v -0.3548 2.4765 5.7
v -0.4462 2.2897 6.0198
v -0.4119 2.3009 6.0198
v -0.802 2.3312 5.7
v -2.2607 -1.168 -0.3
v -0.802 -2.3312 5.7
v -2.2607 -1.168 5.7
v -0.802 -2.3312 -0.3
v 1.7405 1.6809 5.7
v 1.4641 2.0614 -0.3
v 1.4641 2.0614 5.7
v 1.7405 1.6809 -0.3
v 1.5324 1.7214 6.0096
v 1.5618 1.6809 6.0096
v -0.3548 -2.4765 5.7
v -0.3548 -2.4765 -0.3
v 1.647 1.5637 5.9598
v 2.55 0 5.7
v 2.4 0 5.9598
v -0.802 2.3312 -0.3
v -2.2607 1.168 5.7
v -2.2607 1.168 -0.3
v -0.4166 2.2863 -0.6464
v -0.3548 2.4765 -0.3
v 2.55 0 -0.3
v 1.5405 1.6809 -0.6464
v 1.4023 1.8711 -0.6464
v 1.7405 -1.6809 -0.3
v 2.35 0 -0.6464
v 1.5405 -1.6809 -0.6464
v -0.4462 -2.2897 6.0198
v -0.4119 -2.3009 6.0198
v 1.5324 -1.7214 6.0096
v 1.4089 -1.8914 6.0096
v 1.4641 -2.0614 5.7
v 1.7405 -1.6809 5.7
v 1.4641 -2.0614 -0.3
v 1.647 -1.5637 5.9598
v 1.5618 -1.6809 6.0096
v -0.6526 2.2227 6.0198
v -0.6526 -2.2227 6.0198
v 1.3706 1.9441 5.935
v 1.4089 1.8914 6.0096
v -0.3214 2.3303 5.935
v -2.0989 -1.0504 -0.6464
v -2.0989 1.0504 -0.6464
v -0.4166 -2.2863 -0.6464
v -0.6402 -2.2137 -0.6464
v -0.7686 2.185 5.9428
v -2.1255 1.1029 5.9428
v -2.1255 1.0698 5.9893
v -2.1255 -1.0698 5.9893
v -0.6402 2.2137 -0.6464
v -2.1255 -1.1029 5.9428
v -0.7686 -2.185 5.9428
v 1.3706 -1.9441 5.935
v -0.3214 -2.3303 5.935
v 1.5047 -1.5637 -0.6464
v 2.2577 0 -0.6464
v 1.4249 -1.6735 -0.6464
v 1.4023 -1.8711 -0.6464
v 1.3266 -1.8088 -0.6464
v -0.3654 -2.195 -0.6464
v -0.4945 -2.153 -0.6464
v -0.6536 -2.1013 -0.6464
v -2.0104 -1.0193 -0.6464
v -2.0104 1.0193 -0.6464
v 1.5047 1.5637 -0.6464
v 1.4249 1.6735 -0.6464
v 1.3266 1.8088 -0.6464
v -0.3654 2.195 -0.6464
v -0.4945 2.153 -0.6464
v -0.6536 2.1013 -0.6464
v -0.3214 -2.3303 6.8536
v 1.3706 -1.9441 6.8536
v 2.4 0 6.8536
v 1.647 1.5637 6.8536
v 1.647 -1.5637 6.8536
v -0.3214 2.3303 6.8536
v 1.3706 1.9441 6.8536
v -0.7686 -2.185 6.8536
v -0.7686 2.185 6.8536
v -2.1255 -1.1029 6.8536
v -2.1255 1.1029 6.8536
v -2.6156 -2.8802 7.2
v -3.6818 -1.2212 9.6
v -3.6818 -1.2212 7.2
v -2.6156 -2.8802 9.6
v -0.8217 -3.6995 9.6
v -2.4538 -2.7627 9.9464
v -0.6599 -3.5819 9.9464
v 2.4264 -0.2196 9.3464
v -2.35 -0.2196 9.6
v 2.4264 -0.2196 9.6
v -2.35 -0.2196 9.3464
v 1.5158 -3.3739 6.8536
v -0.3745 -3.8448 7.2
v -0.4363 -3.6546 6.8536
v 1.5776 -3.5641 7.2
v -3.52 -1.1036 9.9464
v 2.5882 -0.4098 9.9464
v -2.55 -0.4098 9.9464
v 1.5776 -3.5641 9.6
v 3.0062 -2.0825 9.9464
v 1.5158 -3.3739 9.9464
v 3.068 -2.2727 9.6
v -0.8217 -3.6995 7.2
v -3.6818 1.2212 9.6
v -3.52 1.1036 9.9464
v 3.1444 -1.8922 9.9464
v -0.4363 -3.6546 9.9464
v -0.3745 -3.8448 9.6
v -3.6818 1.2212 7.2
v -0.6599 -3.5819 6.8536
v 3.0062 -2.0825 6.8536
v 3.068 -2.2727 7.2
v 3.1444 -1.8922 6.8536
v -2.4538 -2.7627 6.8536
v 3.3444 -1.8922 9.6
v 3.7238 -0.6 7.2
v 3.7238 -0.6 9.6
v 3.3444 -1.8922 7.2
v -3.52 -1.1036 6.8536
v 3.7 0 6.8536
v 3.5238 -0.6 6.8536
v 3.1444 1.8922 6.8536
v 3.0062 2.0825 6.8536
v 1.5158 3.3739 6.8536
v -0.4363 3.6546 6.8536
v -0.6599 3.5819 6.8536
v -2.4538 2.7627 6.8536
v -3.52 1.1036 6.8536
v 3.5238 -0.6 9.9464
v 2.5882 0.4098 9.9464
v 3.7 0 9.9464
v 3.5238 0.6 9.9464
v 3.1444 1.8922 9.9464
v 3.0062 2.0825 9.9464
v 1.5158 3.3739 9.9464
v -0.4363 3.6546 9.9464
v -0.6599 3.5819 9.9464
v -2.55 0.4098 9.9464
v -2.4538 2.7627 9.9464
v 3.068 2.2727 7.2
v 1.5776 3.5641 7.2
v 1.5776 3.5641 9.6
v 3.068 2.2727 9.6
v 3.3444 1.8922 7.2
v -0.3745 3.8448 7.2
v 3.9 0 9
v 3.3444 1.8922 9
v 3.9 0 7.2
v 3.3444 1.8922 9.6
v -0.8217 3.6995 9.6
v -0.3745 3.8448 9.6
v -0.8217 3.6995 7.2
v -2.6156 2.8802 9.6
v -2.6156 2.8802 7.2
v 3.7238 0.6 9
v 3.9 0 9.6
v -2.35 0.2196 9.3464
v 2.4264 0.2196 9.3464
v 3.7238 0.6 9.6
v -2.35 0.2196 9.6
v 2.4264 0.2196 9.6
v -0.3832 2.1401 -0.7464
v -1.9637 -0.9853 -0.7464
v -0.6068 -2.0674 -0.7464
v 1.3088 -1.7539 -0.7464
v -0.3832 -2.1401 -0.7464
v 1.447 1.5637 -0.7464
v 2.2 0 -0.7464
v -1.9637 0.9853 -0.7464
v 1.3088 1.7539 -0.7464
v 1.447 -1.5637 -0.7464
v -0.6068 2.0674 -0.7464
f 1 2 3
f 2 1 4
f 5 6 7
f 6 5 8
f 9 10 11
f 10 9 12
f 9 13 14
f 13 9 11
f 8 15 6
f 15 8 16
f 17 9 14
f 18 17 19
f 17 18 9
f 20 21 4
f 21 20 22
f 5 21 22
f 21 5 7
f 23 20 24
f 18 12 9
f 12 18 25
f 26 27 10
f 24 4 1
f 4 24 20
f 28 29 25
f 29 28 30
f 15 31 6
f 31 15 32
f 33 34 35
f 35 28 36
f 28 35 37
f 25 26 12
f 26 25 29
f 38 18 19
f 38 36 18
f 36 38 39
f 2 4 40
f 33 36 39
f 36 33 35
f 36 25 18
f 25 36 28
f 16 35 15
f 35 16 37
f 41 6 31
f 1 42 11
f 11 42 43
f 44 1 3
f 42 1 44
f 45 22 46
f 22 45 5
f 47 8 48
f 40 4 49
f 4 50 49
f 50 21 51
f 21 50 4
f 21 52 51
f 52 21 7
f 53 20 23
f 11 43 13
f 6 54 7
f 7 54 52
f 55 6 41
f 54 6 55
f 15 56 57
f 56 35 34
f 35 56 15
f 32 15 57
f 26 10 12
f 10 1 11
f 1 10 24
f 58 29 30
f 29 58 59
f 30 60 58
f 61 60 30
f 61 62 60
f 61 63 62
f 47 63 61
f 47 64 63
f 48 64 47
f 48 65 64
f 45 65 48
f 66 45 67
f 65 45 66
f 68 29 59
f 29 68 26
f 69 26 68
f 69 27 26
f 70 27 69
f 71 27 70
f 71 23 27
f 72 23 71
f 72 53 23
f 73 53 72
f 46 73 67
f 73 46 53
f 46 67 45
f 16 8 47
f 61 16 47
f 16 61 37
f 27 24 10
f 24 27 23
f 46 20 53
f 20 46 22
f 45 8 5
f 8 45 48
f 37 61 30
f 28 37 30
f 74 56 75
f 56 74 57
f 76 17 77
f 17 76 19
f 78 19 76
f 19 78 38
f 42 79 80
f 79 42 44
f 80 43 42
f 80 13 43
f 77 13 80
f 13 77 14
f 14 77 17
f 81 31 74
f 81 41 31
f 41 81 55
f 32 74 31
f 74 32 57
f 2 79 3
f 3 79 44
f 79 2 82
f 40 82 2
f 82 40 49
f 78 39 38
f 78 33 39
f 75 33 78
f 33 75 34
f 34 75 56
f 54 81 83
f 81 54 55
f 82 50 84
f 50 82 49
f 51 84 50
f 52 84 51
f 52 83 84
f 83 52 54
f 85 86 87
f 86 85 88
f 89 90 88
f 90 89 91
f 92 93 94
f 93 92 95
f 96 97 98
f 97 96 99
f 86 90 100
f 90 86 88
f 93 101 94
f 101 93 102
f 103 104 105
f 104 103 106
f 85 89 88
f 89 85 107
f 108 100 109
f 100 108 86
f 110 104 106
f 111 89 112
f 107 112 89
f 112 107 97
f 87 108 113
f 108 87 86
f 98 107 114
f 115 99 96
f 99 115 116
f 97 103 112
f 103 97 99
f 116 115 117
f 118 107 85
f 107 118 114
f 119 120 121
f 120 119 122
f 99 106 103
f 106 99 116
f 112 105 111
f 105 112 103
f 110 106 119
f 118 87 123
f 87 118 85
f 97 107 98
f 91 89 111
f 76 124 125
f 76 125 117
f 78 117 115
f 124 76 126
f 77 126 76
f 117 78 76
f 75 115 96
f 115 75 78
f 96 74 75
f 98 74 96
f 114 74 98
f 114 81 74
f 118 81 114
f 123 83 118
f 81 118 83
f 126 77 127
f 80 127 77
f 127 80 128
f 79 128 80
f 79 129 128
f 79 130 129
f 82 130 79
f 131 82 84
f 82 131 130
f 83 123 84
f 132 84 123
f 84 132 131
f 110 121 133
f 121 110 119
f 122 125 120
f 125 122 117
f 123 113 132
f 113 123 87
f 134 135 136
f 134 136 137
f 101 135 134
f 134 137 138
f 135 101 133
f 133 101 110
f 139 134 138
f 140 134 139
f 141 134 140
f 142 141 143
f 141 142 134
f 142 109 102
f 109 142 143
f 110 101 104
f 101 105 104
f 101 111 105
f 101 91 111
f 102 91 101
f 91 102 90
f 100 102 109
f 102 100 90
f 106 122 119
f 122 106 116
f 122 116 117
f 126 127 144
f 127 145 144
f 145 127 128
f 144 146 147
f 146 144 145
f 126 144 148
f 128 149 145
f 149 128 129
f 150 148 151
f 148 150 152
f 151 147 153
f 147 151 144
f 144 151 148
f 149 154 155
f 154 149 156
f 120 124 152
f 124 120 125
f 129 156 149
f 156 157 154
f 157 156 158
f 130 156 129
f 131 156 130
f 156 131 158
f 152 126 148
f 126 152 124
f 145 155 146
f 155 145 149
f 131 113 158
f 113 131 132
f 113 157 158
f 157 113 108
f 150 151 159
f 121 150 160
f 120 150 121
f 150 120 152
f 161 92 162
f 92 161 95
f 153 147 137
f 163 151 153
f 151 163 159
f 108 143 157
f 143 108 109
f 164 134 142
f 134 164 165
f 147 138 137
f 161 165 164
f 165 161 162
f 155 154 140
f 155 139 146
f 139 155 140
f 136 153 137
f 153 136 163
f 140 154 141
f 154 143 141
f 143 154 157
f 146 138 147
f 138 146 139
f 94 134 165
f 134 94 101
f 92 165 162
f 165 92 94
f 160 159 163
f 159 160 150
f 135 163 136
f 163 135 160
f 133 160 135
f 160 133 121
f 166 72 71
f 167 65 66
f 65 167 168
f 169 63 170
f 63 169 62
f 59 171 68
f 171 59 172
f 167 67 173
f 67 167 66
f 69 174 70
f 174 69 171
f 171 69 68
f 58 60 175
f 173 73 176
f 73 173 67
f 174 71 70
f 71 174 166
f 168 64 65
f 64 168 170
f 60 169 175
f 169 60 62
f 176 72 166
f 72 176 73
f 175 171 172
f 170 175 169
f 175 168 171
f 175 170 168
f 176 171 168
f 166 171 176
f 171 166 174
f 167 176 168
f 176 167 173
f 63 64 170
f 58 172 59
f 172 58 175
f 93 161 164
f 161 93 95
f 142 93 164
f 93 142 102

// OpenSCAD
// Parameters
screw_length = 10; //[5:20:0.1]
shank_diameter = 4; //[2:8:0.1]
head_diameter = 7; //[3.5:14:0.1]
head_height = 2.4; //[1.2:4.8:0.1]
tip_chamfer_height = 0.5; //[0.2:1.5:0.05]
tip_chamfer_diameter_reduction = 0.8; //[0.2:2:0.05]
overlap = 0.8; //[0.2:2:0.1]
thread_length = 6; //[3:12:0.1]
thread_diameter = 4.3; //[4.05:5.5:0.05]
recess_width = 1.2; //[0.6:2.5:0.05]
recess_length = 5.5; //[3:7.5:0.1]
recess_depth = 1.0; //[0.4:2.0:0.05]
head_edge_round_radius = 0.4; //[0.1:1.0:0.05]

// Base Shapes
module shank_cyl() {
  translate([0, 0, (screw_length - head_height) / 2])
    cylinder(h = screw_length - head_height, r = shank_diameter / 2, center = true);
}

module head_cyl() {
  translate([0, 0, screw_length - head_height / 2 - overlap / 2])
    cylinder(h = head_height, r = head_diameter / 2, center = true);
}

module tip_cone() {
  translate([0, 0, tip_chamfer_height / 2 - overlap / 2])
    cylinder(h = tip_chamfer_height, r1 = shank_diameter / 2, r2 = (shank_diameter - tip_chamfer_diameter_reduction) / 2, center = true);
}

module thread_cyl() {
  translate([0, 0, tip_chamfer_height + thread_length / 2 - overlap])
    cylinder(h = thread_length, r = thread_diameter / 2, center = true);
}

module drive_recess_box() {
  translate([0, 0, screw_length - recess_depth / 2])
    cube([recess_length, recess_width, recess_depth], center = true);
}

module head_round_sphere() {
  sphere(r = head_edge_round_radius, center = true);
}

// Operations
module screw_union_raw() {
  union() {
    shank_cyl();
    head_cyl();
    tip_cone();
    thread_cyl();
  }
}

module screw_with_recess() {
  difference() {
    screw_union_raw();
    drive_recess_box();
  }
}

module screw_head_rounded() {
  minkowski() {
    screw_with_recess();
    head_round_sphere();
  }
}

// Final Output
screw_head_rounded();
